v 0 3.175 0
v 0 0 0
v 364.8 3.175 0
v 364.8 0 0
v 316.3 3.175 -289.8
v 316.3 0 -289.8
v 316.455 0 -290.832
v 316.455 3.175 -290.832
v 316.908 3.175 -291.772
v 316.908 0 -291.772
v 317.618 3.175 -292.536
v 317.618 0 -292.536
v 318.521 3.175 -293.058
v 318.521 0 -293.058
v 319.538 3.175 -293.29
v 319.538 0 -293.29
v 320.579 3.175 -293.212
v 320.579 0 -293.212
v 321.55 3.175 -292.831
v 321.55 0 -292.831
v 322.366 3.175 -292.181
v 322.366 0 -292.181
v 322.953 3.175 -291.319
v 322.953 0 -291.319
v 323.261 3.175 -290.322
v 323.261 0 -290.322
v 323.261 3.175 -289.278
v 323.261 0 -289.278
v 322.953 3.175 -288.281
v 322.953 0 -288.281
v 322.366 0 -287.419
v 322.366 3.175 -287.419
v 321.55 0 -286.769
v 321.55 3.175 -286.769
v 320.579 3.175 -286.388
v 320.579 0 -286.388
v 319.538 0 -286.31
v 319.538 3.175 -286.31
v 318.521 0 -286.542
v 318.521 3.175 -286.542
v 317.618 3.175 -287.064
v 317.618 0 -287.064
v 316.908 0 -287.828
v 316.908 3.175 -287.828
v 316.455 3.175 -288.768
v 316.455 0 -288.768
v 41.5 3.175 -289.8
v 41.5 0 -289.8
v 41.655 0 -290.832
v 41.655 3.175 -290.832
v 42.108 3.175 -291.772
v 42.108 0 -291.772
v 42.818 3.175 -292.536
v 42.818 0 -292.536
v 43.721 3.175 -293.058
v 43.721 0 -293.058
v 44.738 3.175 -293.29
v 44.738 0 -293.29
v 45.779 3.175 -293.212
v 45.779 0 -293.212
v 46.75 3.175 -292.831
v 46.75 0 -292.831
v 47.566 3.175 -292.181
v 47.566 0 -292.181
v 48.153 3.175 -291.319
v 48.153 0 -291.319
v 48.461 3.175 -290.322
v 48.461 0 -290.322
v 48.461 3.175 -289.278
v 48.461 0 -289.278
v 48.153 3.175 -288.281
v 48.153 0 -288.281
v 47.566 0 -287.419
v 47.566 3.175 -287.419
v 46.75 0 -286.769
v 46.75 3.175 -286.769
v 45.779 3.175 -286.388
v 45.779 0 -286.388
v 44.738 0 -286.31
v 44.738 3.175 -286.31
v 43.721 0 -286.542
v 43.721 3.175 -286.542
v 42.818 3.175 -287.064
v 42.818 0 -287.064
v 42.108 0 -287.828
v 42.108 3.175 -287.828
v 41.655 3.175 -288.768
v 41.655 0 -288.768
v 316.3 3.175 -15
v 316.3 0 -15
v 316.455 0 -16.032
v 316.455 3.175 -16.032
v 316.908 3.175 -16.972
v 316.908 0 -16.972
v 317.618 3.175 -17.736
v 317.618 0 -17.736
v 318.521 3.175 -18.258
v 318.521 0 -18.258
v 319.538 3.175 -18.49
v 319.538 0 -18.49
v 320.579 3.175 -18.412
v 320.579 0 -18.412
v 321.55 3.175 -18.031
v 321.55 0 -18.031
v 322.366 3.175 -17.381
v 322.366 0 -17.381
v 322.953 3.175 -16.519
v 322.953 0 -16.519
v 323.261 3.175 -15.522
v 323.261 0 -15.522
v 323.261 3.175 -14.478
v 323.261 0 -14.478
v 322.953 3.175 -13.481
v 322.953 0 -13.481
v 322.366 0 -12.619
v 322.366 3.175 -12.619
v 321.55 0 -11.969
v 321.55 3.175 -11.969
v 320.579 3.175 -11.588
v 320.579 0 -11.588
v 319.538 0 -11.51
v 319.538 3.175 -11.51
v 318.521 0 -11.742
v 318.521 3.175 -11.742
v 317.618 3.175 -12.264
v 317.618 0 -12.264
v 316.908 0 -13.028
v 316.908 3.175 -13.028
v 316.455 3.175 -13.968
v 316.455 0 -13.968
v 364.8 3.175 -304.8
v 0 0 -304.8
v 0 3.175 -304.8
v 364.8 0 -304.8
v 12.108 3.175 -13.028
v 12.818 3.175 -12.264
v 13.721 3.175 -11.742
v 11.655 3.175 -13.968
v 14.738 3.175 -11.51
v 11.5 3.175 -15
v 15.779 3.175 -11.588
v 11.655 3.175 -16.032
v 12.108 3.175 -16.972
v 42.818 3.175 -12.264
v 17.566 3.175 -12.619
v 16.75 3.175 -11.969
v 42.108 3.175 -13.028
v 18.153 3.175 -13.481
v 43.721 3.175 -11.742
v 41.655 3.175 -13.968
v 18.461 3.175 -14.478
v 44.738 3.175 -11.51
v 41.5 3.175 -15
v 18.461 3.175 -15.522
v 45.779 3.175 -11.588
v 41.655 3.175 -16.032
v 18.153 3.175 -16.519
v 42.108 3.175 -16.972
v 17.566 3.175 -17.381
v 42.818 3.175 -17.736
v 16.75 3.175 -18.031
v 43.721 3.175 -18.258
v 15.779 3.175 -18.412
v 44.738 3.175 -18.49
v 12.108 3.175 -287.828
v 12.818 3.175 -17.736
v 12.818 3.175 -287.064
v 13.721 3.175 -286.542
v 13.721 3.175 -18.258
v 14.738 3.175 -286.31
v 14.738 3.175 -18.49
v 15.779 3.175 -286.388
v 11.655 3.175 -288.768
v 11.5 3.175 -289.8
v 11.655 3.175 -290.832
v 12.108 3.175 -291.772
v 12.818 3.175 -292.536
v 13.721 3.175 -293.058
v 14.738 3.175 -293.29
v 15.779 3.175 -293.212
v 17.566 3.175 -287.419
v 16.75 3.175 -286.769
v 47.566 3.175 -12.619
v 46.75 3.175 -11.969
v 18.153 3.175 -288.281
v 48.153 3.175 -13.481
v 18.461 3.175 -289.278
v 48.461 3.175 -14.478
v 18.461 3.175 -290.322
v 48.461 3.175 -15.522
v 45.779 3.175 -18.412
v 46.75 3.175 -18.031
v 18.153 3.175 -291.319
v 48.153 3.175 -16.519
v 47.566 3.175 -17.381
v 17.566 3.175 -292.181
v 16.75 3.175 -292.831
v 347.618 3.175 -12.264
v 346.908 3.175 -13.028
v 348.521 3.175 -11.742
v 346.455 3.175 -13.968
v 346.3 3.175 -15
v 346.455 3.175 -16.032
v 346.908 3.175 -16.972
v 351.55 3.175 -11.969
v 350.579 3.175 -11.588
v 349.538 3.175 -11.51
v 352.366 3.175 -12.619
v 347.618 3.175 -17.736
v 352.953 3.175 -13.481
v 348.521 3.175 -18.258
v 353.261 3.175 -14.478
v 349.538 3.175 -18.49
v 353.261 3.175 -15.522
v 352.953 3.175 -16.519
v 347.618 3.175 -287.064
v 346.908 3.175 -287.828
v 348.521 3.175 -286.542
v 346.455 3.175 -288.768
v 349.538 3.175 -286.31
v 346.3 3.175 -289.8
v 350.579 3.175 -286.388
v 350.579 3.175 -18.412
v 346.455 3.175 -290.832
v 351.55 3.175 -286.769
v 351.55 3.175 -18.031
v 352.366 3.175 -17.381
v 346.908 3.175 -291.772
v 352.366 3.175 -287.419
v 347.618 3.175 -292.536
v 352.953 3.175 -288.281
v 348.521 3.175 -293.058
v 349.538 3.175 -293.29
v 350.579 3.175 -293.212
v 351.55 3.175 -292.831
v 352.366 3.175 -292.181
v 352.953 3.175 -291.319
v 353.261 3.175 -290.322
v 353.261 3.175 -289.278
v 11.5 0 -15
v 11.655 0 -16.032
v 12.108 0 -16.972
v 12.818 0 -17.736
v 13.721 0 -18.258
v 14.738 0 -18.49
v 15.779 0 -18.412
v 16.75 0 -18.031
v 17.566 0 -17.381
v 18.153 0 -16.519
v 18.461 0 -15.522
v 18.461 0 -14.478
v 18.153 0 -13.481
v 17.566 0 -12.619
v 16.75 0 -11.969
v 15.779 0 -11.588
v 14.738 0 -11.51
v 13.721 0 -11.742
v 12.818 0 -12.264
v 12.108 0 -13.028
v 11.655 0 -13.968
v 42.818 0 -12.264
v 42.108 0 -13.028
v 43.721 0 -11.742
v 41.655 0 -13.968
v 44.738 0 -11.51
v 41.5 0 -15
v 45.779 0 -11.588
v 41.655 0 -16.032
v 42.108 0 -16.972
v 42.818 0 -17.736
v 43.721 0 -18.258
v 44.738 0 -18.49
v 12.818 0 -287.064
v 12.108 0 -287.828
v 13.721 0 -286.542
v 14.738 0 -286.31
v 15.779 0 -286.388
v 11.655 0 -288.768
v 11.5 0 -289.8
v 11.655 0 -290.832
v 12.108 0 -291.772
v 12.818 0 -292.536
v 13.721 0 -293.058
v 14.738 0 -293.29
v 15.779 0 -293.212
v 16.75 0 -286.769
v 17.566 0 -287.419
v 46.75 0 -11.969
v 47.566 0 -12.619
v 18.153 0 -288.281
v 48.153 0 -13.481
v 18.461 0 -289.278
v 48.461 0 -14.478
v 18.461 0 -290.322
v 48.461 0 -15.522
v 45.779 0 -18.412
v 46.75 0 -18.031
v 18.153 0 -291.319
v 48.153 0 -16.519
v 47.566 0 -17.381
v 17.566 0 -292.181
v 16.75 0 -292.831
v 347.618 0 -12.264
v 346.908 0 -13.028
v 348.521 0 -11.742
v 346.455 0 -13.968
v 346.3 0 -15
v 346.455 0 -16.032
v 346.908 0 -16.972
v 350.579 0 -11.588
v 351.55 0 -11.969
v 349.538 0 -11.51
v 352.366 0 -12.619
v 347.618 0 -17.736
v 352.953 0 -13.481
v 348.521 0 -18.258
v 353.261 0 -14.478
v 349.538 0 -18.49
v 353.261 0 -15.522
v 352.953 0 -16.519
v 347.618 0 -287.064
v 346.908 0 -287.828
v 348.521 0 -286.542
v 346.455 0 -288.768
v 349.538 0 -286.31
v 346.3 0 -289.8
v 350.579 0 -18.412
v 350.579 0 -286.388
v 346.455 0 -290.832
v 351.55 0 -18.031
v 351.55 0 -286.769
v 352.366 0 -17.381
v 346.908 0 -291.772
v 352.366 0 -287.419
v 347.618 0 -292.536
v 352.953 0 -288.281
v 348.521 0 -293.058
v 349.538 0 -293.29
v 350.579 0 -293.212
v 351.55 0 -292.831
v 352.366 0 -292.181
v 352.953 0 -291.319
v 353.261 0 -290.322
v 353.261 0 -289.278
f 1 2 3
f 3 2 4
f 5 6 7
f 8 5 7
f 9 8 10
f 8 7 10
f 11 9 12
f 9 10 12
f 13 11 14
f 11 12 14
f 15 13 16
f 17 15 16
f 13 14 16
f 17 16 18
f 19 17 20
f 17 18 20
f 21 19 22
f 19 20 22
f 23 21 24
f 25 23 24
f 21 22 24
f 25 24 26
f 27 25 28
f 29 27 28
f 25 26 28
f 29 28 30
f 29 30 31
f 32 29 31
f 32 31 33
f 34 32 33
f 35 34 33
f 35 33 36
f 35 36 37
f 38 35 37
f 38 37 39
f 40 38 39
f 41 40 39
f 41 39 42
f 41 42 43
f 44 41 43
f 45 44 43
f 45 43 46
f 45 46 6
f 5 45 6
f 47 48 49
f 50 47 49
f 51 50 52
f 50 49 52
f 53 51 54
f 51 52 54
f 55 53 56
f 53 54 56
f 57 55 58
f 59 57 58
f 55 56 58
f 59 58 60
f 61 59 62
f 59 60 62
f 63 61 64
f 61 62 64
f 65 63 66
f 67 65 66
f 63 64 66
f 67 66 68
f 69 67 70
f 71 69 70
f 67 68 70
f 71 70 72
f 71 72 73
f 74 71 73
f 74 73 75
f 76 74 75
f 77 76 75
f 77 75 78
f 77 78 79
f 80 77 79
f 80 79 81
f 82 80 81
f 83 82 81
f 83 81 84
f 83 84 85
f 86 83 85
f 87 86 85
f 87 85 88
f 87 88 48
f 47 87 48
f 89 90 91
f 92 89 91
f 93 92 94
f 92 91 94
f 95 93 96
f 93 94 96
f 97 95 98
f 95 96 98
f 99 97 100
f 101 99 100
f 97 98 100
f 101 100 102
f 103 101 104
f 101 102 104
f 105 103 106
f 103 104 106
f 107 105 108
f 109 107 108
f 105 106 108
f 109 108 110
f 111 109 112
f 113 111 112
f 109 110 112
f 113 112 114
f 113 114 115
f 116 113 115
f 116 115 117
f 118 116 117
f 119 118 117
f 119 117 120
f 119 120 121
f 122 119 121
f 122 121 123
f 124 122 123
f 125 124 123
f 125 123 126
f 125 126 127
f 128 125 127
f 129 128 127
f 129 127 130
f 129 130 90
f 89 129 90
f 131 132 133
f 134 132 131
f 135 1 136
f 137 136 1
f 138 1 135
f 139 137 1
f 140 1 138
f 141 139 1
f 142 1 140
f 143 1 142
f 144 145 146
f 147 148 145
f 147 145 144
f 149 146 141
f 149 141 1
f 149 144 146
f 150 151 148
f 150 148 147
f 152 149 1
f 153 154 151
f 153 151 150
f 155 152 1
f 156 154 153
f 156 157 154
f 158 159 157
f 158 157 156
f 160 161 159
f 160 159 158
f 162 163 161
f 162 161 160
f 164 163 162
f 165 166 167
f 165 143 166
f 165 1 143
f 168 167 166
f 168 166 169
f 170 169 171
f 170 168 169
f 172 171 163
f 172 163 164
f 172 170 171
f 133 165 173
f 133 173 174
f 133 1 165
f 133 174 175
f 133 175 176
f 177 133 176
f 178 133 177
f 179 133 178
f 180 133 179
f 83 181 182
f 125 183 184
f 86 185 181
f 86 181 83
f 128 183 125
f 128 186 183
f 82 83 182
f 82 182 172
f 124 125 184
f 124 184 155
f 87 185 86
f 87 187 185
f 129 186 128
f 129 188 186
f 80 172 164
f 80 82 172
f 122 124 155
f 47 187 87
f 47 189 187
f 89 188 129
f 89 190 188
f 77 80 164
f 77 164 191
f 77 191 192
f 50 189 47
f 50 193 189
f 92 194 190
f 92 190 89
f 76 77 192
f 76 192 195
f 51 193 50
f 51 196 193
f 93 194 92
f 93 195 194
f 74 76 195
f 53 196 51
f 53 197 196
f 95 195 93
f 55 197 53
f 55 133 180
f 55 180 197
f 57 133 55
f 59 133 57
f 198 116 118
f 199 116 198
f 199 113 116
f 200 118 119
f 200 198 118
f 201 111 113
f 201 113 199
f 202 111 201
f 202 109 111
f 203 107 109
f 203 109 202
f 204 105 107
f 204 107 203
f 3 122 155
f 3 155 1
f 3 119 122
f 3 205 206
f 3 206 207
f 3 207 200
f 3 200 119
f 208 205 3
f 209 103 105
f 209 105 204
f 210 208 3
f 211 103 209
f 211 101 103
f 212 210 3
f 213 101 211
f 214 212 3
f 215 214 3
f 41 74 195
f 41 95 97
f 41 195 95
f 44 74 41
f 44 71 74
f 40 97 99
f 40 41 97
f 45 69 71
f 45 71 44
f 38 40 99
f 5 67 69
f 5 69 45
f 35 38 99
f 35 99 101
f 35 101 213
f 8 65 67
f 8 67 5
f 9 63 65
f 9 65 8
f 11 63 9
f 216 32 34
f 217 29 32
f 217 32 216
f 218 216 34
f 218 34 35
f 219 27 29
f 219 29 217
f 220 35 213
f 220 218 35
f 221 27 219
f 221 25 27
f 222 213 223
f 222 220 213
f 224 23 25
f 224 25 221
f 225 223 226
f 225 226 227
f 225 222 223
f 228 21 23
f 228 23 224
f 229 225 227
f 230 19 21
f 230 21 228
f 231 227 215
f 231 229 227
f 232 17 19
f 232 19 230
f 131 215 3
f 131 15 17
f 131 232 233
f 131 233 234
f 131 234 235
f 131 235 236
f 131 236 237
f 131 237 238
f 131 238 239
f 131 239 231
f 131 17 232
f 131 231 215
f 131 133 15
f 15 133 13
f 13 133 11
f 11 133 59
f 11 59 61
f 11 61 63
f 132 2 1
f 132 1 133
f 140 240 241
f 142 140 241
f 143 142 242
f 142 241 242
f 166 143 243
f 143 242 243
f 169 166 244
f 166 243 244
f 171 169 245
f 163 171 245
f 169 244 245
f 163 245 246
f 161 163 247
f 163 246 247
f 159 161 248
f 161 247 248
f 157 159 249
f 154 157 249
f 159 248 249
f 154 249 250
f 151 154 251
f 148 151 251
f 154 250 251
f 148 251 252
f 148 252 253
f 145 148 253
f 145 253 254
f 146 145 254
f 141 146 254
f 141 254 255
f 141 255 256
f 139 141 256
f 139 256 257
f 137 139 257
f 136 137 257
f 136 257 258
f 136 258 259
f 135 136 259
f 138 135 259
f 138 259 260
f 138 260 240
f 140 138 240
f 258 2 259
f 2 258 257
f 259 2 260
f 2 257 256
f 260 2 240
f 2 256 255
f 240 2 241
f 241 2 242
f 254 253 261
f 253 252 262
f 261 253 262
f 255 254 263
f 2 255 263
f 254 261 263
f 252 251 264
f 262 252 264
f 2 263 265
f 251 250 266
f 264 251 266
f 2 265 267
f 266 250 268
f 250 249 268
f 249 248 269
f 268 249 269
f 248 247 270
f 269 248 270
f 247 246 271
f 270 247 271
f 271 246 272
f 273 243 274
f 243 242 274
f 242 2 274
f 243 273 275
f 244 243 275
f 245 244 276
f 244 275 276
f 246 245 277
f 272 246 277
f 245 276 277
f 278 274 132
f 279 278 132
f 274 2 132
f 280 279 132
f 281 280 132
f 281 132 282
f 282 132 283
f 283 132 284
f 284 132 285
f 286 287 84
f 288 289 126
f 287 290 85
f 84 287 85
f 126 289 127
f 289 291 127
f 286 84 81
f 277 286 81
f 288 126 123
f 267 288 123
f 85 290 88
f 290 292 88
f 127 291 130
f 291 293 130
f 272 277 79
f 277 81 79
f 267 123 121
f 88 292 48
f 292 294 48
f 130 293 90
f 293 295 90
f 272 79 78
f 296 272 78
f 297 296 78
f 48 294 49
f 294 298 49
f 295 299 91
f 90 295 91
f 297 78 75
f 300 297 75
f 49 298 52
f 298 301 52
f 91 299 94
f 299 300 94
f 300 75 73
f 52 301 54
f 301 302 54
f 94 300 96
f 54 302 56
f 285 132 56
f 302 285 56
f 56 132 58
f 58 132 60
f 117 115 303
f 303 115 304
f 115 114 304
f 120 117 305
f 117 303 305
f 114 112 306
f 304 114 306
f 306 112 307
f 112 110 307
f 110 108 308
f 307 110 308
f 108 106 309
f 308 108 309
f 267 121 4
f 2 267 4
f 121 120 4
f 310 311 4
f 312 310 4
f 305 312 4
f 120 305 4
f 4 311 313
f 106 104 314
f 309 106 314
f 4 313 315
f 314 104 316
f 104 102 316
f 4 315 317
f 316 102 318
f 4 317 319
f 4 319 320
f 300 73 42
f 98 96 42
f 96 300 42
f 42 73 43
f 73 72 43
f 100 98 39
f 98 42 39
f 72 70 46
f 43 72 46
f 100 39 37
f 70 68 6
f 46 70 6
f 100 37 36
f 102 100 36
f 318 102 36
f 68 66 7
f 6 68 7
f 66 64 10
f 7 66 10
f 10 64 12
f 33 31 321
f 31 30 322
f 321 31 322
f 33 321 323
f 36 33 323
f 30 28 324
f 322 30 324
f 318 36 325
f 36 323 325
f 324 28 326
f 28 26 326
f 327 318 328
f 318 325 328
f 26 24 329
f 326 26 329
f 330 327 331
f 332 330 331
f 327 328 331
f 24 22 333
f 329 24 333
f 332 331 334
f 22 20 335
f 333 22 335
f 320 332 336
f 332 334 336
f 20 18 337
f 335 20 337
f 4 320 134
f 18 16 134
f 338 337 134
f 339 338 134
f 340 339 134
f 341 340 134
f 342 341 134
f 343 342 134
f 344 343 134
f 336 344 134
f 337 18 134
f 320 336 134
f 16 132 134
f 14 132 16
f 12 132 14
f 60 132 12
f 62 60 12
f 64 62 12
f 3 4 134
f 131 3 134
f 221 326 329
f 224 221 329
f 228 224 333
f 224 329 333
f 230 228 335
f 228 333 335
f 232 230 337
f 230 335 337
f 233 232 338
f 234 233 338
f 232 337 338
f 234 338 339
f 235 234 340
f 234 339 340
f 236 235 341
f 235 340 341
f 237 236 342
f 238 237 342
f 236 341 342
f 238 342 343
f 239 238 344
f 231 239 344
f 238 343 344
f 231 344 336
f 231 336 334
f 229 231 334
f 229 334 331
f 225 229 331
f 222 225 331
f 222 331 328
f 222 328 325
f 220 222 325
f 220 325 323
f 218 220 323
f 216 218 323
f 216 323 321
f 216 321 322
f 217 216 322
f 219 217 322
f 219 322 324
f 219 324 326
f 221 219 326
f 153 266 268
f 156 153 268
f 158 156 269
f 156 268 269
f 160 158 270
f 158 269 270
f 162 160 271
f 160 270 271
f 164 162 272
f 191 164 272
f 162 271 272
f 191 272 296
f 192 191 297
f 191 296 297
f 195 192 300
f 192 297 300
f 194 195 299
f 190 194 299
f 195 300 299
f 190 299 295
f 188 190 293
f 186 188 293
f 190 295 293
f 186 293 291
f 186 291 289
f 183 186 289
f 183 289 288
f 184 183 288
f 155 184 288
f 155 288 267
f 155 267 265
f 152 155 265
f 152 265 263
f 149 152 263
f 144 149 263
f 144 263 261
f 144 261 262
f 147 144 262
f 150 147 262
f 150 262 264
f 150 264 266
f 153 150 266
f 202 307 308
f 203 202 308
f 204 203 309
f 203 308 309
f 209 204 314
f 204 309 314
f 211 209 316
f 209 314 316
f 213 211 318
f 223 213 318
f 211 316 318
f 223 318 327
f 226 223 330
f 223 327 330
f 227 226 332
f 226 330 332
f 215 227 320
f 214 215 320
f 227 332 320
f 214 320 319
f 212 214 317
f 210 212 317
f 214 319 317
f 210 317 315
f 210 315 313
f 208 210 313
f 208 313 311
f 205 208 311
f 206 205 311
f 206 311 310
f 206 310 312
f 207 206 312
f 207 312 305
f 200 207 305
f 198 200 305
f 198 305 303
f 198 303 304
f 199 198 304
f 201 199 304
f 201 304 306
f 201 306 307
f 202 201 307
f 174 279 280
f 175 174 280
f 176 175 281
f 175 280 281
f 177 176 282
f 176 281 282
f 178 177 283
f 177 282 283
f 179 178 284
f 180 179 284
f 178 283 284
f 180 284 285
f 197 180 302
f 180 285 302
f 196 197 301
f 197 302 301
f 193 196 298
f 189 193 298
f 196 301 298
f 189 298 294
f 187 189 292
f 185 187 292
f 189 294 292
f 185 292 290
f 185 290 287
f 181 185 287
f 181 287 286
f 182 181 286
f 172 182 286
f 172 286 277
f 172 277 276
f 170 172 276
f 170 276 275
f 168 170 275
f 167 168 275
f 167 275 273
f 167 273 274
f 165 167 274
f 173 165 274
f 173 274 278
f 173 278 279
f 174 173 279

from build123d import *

# Parameters (mm, degrees)
SKETCH1_W           = 364.8
SKETCH1_H           = 304.8
BOSS_EXTRUDE1_DEPTH = 3.175
HOLE1_D             = 7


with BuildPart() as part:
    # Sketch1 → Boss-Extrude1 (new body)
    with BuildSketch(Plane(origin=(0, 0, 0), x_dir=(1, 0, 0), z_dir=(0, 1, 0))):
        with Locations((182.4, 152.4)):
            Rectangle(SKETCH1_W, SKETCH1_H)
    extrude(amount=BOSS_EXTRUDE1_DEPTH)

    # Hole1 (through all)
    with Locations(Plane(origin=(0, 3.175, 0), x_dir=(1, 0, 0), z_dir=(0, 1, 0))):
        with Locations((45, 15), (15, 289.8), (349.8, 289.8), (349.8, 15), (15, 15), (45, 289.8), (319.8, 289.8), (319.8, 15)):
            Hole(HOLE1_D / 2)


solid = part.part
